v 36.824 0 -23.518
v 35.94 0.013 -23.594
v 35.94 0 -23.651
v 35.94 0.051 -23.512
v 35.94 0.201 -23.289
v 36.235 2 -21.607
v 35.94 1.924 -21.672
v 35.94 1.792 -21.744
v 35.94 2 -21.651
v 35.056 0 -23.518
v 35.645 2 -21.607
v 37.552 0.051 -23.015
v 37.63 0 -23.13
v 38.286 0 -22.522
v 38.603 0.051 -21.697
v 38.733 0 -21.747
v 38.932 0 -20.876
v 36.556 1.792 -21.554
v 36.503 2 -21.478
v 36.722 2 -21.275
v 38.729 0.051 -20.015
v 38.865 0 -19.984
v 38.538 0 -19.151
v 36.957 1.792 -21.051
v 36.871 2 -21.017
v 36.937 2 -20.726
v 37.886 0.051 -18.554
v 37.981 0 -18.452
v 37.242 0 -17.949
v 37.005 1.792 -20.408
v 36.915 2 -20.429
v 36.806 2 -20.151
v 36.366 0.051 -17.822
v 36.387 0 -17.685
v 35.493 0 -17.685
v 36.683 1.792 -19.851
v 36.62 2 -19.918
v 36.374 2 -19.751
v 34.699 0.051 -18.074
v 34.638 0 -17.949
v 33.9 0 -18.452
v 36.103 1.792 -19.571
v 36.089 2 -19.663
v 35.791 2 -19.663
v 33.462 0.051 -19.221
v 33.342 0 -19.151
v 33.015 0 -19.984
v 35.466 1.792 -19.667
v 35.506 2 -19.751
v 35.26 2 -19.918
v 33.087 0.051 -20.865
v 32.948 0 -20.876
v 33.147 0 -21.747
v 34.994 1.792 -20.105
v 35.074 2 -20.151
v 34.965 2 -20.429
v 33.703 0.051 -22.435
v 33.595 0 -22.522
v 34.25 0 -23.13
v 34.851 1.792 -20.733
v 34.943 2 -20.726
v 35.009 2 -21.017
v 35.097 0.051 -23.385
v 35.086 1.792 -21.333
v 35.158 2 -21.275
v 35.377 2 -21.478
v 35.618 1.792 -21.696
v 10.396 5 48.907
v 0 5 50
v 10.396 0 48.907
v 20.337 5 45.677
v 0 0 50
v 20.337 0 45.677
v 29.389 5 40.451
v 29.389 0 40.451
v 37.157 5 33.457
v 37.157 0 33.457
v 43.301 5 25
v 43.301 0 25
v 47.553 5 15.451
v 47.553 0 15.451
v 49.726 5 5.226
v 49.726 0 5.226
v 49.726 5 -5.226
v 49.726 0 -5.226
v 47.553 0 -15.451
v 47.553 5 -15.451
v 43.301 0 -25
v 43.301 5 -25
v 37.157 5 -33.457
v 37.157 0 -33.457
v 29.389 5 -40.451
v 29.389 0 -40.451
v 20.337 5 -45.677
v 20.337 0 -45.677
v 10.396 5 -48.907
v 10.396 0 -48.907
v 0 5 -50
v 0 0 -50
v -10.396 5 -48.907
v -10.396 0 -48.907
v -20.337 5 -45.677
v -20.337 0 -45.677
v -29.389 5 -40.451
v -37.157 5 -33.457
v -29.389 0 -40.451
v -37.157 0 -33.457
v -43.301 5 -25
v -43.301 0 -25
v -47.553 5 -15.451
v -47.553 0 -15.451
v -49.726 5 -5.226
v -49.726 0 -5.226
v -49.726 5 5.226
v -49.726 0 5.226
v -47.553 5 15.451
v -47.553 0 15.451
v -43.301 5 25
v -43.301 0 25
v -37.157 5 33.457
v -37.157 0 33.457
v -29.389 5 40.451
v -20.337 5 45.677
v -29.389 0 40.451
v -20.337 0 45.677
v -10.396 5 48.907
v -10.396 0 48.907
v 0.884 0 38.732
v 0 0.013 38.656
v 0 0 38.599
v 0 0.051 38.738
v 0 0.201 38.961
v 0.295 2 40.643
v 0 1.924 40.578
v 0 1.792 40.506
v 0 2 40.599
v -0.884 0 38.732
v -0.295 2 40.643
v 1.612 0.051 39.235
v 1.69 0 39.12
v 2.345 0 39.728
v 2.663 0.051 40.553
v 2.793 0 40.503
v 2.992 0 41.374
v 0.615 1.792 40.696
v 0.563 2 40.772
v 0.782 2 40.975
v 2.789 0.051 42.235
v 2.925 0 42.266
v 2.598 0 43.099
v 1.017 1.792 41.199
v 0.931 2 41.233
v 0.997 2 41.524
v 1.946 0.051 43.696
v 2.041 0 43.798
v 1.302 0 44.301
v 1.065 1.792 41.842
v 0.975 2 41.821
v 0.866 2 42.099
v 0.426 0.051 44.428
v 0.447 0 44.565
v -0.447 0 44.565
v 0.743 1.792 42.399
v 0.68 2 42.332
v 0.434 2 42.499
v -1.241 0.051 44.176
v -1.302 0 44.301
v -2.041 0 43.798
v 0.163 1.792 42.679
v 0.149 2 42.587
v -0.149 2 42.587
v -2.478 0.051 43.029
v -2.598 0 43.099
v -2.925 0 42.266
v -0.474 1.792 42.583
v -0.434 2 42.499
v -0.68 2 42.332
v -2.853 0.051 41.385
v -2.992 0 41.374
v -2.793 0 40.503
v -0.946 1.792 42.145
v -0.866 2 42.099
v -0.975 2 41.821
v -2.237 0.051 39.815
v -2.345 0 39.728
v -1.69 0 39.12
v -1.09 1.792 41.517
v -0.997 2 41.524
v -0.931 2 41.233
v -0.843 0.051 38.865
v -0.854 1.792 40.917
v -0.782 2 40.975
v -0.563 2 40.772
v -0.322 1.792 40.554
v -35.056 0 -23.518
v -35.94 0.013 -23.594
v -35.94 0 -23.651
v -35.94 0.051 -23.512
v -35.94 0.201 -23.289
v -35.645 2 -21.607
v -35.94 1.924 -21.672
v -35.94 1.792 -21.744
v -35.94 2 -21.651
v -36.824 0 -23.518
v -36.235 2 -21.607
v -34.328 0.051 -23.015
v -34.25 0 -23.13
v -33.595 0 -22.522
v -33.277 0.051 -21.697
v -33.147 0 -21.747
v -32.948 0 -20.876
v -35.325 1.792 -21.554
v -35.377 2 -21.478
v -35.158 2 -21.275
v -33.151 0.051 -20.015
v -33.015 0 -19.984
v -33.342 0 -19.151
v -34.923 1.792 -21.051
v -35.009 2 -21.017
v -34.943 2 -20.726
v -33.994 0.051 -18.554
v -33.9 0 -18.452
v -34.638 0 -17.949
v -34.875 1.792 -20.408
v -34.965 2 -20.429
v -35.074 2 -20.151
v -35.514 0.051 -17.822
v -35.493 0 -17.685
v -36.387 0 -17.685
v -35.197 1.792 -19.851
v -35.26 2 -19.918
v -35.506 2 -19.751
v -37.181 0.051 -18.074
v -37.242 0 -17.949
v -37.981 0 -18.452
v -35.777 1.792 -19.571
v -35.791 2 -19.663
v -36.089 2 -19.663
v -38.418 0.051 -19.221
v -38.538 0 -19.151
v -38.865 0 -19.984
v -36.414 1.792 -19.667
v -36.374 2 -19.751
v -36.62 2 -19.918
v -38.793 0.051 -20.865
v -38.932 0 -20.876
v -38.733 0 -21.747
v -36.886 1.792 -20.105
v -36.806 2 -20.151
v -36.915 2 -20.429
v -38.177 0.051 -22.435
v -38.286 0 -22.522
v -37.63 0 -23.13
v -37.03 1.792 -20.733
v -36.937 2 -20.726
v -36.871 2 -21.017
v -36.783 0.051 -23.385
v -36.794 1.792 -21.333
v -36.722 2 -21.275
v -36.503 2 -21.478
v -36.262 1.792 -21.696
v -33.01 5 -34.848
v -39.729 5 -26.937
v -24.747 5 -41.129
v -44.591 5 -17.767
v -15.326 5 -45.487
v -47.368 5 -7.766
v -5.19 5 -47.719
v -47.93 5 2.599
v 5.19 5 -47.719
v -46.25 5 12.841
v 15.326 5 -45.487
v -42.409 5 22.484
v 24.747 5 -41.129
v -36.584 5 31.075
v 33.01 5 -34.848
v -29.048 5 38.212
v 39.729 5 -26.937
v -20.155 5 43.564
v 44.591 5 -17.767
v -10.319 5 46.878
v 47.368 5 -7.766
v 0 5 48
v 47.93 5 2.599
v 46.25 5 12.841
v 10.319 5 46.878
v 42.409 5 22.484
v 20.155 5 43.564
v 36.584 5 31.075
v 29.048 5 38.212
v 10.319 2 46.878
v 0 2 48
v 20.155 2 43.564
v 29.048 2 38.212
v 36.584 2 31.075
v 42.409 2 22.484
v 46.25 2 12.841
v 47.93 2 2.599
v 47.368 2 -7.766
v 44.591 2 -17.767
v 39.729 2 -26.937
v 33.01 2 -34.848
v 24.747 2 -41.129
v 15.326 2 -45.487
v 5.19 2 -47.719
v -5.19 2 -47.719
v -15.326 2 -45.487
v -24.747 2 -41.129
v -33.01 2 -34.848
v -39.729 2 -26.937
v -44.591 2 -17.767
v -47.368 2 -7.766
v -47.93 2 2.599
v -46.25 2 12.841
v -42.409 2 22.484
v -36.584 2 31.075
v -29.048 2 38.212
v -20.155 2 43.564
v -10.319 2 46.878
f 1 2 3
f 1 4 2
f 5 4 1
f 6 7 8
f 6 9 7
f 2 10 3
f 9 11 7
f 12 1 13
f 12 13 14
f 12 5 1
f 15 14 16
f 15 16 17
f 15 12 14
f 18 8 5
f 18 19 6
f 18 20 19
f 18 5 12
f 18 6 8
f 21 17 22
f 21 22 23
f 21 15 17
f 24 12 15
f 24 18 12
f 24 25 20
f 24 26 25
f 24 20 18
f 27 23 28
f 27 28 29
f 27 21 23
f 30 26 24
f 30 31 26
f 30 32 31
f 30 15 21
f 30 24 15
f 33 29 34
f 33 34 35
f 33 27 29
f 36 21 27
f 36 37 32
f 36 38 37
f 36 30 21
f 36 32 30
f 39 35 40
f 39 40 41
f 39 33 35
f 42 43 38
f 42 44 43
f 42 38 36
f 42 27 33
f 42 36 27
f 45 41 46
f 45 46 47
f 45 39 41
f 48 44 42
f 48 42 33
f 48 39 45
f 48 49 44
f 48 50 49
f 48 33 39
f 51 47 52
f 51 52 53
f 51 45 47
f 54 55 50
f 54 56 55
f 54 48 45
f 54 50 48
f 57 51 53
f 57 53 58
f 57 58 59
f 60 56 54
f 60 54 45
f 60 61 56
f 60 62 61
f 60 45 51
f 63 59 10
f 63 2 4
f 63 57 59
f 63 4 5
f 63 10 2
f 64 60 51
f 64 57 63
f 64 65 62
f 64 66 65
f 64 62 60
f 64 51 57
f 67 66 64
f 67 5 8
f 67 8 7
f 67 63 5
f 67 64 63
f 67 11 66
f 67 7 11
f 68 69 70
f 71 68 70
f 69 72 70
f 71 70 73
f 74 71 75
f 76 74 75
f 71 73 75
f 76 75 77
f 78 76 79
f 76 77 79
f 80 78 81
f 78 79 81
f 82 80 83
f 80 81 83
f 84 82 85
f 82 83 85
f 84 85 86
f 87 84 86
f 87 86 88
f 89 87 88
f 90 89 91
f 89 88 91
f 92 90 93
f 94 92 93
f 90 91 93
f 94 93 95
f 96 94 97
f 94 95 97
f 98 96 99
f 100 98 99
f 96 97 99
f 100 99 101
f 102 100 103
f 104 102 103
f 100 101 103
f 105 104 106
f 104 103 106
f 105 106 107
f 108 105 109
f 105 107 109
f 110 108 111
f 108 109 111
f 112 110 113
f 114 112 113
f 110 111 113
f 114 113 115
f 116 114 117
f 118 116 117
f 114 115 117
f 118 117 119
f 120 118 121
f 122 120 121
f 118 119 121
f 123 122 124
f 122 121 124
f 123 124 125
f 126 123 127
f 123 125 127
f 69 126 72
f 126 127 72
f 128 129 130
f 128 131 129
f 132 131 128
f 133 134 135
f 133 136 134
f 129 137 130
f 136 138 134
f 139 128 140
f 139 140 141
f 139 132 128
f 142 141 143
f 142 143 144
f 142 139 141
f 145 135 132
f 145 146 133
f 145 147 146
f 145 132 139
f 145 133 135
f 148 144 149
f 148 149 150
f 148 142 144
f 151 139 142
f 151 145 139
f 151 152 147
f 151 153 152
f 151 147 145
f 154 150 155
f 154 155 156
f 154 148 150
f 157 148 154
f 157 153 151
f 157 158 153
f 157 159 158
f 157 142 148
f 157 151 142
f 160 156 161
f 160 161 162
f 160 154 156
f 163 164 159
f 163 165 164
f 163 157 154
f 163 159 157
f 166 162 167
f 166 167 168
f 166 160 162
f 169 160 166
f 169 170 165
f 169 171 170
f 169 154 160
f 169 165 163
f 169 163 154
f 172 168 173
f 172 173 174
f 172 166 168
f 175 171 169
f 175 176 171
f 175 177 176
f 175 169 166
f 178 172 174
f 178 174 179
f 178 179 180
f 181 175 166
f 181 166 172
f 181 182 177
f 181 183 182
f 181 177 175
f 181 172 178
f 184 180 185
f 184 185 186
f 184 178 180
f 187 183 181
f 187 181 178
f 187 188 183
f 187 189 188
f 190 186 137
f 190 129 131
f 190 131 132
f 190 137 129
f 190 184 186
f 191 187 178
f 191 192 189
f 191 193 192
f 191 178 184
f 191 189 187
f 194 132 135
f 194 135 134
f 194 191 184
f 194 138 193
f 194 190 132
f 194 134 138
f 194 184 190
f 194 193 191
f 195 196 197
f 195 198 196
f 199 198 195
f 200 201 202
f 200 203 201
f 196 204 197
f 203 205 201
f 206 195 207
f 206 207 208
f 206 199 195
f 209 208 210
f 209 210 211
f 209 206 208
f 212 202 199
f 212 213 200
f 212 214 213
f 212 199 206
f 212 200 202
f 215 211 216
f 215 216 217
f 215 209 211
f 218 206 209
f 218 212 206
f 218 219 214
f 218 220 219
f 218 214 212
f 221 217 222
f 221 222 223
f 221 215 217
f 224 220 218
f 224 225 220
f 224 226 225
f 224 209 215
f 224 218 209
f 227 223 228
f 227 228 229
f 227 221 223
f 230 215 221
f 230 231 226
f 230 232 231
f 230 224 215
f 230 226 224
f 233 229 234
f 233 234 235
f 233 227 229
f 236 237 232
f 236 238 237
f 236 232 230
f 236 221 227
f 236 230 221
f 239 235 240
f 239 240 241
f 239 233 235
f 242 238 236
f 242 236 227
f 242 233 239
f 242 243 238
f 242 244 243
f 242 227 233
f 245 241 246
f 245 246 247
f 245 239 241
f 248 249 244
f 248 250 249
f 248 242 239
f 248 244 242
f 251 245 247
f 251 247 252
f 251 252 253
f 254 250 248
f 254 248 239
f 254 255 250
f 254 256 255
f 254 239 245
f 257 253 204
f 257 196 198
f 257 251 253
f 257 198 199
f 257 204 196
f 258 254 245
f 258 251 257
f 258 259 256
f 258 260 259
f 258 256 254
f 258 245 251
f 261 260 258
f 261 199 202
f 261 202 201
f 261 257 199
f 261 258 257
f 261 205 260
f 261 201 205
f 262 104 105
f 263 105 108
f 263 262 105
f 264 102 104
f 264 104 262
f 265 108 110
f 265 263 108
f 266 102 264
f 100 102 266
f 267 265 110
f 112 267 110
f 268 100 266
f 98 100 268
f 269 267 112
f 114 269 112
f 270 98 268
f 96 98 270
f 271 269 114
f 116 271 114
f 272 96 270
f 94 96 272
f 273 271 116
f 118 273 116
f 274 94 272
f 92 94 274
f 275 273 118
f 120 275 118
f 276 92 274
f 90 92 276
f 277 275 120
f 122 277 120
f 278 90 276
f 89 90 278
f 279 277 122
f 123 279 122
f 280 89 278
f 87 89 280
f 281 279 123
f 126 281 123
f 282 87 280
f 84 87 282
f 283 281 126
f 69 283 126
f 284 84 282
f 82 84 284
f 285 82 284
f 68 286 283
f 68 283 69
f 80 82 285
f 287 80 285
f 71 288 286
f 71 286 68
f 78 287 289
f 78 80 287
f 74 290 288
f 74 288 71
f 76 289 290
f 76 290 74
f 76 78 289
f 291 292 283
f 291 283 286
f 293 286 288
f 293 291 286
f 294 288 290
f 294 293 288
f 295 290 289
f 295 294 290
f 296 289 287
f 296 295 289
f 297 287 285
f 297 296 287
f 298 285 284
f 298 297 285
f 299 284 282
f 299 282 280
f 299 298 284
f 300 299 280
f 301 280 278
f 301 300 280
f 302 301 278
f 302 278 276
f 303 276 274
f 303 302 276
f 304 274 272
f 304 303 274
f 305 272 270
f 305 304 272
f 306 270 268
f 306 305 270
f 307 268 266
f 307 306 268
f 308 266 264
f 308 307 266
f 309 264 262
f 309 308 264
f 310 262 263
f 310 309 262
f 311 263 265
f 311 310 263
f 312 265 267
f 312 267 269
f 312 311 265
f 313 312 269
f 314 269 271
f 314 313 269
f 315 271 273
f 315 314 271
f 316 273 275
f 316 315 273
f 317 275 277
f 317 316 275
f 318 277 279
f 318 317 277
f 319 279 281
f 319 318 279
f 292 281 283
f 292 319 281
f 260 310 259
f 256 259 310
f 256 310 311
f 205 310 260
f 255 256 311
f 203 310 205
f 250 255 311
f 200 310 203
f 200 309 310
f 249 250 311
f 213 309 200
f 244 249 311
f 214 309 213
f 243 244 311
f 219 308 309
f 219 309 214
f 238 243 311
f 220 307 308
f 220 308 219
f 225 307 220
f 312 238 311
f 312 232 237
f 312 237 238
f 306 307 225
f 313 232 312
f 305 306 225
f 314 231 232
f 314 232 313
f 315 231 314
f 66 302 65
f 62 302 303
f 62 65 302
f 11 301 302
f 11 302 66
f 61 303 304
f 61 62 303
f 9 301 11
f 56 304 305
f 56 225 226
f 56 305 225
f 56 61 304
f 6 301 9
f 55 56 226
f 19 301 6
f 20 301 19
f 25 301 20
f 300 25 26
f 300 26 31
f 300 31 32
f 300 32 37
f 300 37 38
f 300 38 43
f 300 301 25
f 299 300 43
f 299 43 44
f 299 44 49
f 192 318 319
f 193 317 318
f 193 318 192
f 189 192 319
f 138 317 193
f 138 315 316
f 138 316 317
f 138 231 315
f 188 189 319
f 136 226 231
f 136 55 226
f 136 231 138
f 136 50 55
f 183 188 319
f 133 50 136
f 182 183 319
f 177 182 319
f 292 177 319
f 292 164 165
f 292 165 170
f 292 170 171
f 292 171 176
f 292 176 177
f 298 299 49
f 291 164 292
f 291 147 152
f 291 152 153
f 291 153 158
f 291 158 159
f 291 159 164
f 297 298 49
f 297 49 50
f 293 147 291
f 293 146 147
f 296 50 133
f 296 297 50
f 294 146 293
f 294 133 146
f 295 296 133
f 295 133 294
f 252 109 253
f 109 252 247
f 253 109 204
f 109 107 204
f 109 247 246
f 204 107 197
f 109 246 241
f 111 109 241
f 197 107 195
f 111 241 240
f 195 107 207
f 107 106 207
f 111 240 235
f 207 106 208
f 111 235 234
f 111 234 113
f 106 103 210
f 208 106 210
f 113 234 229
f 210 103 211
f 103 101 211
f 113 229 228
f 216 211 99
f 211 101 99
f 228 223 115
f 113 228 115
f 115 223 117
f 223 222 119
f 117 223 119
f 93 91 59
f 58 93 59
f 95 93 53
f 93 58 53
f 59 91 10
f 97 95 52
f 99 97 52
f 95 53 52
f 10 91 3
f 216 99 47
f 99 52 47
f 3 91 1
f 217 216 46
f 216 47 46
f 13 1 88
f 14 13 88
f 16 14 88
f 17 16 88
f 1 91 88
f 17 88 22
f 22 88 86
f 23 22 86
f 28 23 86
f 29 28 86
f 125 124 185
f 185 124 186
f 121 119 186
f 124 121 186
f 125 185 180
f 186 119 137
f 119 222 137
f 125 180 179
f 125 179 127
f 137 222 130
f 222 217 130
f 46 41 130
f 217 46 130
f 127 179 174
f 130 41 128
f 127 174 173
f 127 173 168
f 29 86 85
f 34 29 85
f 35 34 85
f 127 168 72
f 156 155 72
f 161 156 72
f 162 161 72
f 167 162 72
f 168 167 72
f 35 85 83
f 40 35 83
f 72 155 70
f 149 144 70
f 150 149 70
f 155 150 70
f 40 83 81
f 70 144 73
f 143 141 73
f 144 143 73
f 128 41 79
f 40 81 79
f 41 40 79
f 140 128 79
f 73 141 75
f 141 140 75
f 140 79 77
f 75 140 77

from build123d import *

# Parameters (mm, degrees)
SKETCH_1_R          = 50
EXTRUDE_1_DEPTH     = 2
SKETCH_2_R          = 50
SKETCH_2_R_2        = 48
EXTRUDE_2_DEPTH     = 3
SKETCH_3_R          = 1
CUT_EXTRUDE_1_DEPTH = 20
FILLET_1_SIZE       = 2


with BuildPart() as part:
    # 草图1 → 凸台-拉伸1 (new body)
    with BuildSketch(Plane(origin=(0, 0, 0), x_dir=(1, 0, 0), z_dir=(0, 1, 0))):
        with Locations(Location((0, 0, 0), (0, 0, 270))):
            Circle(SKETCH_1_R)
    extrude(amount=EXTRUDE_1_DEPTH)

    # 草图2 → 凸台-拉伸2 (add)
    with BuildSketch(Plane(origin=(0, 2, 0), x_dir=(1, 0, 0), z_dir=(0, 1, 0))):
        with Locations(Location((0, 0, 0), (0, 0, 270))):
            Circle(SKETCH_2_R)
        with Locations(Location((0, 0, 0), (0, 0, 270))):
            Circle(SKETCH_2_R_2, mode=Mode.SUBTRACT)
    extrude(amount=EXTRUDE_2_DEPTH)

    # 草图3 → 切除-拉伸1 (cut)
    with BuildSketch(Plane.XZ):
        with Locations(Location((0, 41.598526054, 0), (0, 0, 270))):
            Circle(SKETCH_3_R)
        with Locations(Location((-35.940054257, -20.651473946, 0), (0, 0, 270))):
            Circle(SKETCH_3_R)
        with Locations(Location((35.940054257, -20.651473946, 0), (0, 0, 270))):
            Circle(SKETCH_3_R)
    extrude(amount=-CUT_EXTRUDE_1_DEPTH, mode=Mode.SUBTRACT)

    # 圆角1
    # a fillet whose section is not a circle: 2 mm, written as the material it takes off along each edge
    with BuildSketch(Plane(origin=(0, 0, 41.598526054), x_dir=(0, 0, -1), z_dir=(-1, 0, 0))) as fillet_1_piece_1:
        with BuildLine():
            Bezier((1 + FILLET_1_SIZE, 0), (1, 0), (1, -FILLET_1_SIZE), weights=[1, 0.141421356, 1])
            Line((1, -FILLET_1_SIZE), (1, 0))
            Line((1, 0), (1 + FILLET_1_SIZE, 0))
        make_face()
    revolve(axis=Axis((0, 0, 41.598526054), (0, -1, 0)), mode=Mode.SUBTRACT)
    with BuildSketch(Plane(origin=(-35.940054257, 0, -20.651473946), x_dir=(0, 0, -1), z_dir=(-1, 0, 0))) as fillet_1_piece_2:
        with BuildLine():
            Bezier((1 + FILLET_1_SIZE, 0), (1, 0), (1, -FILLET_1_SIZE), weights=[1, 0.141421356, 1])
            Line((1, -FILLET_1_SIZE), (1, 0))
            Line((1, 0), (1 + FILLET_1_SIZE, 0))
        make_face()
    revolve(axis=Axis((-35.940054257, 0, -20.651473946), (0, -1, 0)), mode=Mode.SUBTRACT)
    with BuildSketch(Plane(origin=(35.940054257, 0, -20.651473946), x_dir=(0, 0, -1), z_dir=(-1, 0, 0))) as fillet_1_piece_3:
        with BuildLine():
            Bezier((1 + FILLET_1_SIZE, 0), (1, 0), (1, -FILLET_1_SIZE), weights=[1, 0.141421356, 1])
            Line((1, -FILLET_1_SIZE), (1, 0))
            Line((1, 0), (1 + FILLET_1_SIZE, 0))
        make_face()
    revolve(axis=Axis((35.940054257, 0, -20.651473946), (0, -1, 0)), mode=Mode.SUBTRACT)


solid = part.part
